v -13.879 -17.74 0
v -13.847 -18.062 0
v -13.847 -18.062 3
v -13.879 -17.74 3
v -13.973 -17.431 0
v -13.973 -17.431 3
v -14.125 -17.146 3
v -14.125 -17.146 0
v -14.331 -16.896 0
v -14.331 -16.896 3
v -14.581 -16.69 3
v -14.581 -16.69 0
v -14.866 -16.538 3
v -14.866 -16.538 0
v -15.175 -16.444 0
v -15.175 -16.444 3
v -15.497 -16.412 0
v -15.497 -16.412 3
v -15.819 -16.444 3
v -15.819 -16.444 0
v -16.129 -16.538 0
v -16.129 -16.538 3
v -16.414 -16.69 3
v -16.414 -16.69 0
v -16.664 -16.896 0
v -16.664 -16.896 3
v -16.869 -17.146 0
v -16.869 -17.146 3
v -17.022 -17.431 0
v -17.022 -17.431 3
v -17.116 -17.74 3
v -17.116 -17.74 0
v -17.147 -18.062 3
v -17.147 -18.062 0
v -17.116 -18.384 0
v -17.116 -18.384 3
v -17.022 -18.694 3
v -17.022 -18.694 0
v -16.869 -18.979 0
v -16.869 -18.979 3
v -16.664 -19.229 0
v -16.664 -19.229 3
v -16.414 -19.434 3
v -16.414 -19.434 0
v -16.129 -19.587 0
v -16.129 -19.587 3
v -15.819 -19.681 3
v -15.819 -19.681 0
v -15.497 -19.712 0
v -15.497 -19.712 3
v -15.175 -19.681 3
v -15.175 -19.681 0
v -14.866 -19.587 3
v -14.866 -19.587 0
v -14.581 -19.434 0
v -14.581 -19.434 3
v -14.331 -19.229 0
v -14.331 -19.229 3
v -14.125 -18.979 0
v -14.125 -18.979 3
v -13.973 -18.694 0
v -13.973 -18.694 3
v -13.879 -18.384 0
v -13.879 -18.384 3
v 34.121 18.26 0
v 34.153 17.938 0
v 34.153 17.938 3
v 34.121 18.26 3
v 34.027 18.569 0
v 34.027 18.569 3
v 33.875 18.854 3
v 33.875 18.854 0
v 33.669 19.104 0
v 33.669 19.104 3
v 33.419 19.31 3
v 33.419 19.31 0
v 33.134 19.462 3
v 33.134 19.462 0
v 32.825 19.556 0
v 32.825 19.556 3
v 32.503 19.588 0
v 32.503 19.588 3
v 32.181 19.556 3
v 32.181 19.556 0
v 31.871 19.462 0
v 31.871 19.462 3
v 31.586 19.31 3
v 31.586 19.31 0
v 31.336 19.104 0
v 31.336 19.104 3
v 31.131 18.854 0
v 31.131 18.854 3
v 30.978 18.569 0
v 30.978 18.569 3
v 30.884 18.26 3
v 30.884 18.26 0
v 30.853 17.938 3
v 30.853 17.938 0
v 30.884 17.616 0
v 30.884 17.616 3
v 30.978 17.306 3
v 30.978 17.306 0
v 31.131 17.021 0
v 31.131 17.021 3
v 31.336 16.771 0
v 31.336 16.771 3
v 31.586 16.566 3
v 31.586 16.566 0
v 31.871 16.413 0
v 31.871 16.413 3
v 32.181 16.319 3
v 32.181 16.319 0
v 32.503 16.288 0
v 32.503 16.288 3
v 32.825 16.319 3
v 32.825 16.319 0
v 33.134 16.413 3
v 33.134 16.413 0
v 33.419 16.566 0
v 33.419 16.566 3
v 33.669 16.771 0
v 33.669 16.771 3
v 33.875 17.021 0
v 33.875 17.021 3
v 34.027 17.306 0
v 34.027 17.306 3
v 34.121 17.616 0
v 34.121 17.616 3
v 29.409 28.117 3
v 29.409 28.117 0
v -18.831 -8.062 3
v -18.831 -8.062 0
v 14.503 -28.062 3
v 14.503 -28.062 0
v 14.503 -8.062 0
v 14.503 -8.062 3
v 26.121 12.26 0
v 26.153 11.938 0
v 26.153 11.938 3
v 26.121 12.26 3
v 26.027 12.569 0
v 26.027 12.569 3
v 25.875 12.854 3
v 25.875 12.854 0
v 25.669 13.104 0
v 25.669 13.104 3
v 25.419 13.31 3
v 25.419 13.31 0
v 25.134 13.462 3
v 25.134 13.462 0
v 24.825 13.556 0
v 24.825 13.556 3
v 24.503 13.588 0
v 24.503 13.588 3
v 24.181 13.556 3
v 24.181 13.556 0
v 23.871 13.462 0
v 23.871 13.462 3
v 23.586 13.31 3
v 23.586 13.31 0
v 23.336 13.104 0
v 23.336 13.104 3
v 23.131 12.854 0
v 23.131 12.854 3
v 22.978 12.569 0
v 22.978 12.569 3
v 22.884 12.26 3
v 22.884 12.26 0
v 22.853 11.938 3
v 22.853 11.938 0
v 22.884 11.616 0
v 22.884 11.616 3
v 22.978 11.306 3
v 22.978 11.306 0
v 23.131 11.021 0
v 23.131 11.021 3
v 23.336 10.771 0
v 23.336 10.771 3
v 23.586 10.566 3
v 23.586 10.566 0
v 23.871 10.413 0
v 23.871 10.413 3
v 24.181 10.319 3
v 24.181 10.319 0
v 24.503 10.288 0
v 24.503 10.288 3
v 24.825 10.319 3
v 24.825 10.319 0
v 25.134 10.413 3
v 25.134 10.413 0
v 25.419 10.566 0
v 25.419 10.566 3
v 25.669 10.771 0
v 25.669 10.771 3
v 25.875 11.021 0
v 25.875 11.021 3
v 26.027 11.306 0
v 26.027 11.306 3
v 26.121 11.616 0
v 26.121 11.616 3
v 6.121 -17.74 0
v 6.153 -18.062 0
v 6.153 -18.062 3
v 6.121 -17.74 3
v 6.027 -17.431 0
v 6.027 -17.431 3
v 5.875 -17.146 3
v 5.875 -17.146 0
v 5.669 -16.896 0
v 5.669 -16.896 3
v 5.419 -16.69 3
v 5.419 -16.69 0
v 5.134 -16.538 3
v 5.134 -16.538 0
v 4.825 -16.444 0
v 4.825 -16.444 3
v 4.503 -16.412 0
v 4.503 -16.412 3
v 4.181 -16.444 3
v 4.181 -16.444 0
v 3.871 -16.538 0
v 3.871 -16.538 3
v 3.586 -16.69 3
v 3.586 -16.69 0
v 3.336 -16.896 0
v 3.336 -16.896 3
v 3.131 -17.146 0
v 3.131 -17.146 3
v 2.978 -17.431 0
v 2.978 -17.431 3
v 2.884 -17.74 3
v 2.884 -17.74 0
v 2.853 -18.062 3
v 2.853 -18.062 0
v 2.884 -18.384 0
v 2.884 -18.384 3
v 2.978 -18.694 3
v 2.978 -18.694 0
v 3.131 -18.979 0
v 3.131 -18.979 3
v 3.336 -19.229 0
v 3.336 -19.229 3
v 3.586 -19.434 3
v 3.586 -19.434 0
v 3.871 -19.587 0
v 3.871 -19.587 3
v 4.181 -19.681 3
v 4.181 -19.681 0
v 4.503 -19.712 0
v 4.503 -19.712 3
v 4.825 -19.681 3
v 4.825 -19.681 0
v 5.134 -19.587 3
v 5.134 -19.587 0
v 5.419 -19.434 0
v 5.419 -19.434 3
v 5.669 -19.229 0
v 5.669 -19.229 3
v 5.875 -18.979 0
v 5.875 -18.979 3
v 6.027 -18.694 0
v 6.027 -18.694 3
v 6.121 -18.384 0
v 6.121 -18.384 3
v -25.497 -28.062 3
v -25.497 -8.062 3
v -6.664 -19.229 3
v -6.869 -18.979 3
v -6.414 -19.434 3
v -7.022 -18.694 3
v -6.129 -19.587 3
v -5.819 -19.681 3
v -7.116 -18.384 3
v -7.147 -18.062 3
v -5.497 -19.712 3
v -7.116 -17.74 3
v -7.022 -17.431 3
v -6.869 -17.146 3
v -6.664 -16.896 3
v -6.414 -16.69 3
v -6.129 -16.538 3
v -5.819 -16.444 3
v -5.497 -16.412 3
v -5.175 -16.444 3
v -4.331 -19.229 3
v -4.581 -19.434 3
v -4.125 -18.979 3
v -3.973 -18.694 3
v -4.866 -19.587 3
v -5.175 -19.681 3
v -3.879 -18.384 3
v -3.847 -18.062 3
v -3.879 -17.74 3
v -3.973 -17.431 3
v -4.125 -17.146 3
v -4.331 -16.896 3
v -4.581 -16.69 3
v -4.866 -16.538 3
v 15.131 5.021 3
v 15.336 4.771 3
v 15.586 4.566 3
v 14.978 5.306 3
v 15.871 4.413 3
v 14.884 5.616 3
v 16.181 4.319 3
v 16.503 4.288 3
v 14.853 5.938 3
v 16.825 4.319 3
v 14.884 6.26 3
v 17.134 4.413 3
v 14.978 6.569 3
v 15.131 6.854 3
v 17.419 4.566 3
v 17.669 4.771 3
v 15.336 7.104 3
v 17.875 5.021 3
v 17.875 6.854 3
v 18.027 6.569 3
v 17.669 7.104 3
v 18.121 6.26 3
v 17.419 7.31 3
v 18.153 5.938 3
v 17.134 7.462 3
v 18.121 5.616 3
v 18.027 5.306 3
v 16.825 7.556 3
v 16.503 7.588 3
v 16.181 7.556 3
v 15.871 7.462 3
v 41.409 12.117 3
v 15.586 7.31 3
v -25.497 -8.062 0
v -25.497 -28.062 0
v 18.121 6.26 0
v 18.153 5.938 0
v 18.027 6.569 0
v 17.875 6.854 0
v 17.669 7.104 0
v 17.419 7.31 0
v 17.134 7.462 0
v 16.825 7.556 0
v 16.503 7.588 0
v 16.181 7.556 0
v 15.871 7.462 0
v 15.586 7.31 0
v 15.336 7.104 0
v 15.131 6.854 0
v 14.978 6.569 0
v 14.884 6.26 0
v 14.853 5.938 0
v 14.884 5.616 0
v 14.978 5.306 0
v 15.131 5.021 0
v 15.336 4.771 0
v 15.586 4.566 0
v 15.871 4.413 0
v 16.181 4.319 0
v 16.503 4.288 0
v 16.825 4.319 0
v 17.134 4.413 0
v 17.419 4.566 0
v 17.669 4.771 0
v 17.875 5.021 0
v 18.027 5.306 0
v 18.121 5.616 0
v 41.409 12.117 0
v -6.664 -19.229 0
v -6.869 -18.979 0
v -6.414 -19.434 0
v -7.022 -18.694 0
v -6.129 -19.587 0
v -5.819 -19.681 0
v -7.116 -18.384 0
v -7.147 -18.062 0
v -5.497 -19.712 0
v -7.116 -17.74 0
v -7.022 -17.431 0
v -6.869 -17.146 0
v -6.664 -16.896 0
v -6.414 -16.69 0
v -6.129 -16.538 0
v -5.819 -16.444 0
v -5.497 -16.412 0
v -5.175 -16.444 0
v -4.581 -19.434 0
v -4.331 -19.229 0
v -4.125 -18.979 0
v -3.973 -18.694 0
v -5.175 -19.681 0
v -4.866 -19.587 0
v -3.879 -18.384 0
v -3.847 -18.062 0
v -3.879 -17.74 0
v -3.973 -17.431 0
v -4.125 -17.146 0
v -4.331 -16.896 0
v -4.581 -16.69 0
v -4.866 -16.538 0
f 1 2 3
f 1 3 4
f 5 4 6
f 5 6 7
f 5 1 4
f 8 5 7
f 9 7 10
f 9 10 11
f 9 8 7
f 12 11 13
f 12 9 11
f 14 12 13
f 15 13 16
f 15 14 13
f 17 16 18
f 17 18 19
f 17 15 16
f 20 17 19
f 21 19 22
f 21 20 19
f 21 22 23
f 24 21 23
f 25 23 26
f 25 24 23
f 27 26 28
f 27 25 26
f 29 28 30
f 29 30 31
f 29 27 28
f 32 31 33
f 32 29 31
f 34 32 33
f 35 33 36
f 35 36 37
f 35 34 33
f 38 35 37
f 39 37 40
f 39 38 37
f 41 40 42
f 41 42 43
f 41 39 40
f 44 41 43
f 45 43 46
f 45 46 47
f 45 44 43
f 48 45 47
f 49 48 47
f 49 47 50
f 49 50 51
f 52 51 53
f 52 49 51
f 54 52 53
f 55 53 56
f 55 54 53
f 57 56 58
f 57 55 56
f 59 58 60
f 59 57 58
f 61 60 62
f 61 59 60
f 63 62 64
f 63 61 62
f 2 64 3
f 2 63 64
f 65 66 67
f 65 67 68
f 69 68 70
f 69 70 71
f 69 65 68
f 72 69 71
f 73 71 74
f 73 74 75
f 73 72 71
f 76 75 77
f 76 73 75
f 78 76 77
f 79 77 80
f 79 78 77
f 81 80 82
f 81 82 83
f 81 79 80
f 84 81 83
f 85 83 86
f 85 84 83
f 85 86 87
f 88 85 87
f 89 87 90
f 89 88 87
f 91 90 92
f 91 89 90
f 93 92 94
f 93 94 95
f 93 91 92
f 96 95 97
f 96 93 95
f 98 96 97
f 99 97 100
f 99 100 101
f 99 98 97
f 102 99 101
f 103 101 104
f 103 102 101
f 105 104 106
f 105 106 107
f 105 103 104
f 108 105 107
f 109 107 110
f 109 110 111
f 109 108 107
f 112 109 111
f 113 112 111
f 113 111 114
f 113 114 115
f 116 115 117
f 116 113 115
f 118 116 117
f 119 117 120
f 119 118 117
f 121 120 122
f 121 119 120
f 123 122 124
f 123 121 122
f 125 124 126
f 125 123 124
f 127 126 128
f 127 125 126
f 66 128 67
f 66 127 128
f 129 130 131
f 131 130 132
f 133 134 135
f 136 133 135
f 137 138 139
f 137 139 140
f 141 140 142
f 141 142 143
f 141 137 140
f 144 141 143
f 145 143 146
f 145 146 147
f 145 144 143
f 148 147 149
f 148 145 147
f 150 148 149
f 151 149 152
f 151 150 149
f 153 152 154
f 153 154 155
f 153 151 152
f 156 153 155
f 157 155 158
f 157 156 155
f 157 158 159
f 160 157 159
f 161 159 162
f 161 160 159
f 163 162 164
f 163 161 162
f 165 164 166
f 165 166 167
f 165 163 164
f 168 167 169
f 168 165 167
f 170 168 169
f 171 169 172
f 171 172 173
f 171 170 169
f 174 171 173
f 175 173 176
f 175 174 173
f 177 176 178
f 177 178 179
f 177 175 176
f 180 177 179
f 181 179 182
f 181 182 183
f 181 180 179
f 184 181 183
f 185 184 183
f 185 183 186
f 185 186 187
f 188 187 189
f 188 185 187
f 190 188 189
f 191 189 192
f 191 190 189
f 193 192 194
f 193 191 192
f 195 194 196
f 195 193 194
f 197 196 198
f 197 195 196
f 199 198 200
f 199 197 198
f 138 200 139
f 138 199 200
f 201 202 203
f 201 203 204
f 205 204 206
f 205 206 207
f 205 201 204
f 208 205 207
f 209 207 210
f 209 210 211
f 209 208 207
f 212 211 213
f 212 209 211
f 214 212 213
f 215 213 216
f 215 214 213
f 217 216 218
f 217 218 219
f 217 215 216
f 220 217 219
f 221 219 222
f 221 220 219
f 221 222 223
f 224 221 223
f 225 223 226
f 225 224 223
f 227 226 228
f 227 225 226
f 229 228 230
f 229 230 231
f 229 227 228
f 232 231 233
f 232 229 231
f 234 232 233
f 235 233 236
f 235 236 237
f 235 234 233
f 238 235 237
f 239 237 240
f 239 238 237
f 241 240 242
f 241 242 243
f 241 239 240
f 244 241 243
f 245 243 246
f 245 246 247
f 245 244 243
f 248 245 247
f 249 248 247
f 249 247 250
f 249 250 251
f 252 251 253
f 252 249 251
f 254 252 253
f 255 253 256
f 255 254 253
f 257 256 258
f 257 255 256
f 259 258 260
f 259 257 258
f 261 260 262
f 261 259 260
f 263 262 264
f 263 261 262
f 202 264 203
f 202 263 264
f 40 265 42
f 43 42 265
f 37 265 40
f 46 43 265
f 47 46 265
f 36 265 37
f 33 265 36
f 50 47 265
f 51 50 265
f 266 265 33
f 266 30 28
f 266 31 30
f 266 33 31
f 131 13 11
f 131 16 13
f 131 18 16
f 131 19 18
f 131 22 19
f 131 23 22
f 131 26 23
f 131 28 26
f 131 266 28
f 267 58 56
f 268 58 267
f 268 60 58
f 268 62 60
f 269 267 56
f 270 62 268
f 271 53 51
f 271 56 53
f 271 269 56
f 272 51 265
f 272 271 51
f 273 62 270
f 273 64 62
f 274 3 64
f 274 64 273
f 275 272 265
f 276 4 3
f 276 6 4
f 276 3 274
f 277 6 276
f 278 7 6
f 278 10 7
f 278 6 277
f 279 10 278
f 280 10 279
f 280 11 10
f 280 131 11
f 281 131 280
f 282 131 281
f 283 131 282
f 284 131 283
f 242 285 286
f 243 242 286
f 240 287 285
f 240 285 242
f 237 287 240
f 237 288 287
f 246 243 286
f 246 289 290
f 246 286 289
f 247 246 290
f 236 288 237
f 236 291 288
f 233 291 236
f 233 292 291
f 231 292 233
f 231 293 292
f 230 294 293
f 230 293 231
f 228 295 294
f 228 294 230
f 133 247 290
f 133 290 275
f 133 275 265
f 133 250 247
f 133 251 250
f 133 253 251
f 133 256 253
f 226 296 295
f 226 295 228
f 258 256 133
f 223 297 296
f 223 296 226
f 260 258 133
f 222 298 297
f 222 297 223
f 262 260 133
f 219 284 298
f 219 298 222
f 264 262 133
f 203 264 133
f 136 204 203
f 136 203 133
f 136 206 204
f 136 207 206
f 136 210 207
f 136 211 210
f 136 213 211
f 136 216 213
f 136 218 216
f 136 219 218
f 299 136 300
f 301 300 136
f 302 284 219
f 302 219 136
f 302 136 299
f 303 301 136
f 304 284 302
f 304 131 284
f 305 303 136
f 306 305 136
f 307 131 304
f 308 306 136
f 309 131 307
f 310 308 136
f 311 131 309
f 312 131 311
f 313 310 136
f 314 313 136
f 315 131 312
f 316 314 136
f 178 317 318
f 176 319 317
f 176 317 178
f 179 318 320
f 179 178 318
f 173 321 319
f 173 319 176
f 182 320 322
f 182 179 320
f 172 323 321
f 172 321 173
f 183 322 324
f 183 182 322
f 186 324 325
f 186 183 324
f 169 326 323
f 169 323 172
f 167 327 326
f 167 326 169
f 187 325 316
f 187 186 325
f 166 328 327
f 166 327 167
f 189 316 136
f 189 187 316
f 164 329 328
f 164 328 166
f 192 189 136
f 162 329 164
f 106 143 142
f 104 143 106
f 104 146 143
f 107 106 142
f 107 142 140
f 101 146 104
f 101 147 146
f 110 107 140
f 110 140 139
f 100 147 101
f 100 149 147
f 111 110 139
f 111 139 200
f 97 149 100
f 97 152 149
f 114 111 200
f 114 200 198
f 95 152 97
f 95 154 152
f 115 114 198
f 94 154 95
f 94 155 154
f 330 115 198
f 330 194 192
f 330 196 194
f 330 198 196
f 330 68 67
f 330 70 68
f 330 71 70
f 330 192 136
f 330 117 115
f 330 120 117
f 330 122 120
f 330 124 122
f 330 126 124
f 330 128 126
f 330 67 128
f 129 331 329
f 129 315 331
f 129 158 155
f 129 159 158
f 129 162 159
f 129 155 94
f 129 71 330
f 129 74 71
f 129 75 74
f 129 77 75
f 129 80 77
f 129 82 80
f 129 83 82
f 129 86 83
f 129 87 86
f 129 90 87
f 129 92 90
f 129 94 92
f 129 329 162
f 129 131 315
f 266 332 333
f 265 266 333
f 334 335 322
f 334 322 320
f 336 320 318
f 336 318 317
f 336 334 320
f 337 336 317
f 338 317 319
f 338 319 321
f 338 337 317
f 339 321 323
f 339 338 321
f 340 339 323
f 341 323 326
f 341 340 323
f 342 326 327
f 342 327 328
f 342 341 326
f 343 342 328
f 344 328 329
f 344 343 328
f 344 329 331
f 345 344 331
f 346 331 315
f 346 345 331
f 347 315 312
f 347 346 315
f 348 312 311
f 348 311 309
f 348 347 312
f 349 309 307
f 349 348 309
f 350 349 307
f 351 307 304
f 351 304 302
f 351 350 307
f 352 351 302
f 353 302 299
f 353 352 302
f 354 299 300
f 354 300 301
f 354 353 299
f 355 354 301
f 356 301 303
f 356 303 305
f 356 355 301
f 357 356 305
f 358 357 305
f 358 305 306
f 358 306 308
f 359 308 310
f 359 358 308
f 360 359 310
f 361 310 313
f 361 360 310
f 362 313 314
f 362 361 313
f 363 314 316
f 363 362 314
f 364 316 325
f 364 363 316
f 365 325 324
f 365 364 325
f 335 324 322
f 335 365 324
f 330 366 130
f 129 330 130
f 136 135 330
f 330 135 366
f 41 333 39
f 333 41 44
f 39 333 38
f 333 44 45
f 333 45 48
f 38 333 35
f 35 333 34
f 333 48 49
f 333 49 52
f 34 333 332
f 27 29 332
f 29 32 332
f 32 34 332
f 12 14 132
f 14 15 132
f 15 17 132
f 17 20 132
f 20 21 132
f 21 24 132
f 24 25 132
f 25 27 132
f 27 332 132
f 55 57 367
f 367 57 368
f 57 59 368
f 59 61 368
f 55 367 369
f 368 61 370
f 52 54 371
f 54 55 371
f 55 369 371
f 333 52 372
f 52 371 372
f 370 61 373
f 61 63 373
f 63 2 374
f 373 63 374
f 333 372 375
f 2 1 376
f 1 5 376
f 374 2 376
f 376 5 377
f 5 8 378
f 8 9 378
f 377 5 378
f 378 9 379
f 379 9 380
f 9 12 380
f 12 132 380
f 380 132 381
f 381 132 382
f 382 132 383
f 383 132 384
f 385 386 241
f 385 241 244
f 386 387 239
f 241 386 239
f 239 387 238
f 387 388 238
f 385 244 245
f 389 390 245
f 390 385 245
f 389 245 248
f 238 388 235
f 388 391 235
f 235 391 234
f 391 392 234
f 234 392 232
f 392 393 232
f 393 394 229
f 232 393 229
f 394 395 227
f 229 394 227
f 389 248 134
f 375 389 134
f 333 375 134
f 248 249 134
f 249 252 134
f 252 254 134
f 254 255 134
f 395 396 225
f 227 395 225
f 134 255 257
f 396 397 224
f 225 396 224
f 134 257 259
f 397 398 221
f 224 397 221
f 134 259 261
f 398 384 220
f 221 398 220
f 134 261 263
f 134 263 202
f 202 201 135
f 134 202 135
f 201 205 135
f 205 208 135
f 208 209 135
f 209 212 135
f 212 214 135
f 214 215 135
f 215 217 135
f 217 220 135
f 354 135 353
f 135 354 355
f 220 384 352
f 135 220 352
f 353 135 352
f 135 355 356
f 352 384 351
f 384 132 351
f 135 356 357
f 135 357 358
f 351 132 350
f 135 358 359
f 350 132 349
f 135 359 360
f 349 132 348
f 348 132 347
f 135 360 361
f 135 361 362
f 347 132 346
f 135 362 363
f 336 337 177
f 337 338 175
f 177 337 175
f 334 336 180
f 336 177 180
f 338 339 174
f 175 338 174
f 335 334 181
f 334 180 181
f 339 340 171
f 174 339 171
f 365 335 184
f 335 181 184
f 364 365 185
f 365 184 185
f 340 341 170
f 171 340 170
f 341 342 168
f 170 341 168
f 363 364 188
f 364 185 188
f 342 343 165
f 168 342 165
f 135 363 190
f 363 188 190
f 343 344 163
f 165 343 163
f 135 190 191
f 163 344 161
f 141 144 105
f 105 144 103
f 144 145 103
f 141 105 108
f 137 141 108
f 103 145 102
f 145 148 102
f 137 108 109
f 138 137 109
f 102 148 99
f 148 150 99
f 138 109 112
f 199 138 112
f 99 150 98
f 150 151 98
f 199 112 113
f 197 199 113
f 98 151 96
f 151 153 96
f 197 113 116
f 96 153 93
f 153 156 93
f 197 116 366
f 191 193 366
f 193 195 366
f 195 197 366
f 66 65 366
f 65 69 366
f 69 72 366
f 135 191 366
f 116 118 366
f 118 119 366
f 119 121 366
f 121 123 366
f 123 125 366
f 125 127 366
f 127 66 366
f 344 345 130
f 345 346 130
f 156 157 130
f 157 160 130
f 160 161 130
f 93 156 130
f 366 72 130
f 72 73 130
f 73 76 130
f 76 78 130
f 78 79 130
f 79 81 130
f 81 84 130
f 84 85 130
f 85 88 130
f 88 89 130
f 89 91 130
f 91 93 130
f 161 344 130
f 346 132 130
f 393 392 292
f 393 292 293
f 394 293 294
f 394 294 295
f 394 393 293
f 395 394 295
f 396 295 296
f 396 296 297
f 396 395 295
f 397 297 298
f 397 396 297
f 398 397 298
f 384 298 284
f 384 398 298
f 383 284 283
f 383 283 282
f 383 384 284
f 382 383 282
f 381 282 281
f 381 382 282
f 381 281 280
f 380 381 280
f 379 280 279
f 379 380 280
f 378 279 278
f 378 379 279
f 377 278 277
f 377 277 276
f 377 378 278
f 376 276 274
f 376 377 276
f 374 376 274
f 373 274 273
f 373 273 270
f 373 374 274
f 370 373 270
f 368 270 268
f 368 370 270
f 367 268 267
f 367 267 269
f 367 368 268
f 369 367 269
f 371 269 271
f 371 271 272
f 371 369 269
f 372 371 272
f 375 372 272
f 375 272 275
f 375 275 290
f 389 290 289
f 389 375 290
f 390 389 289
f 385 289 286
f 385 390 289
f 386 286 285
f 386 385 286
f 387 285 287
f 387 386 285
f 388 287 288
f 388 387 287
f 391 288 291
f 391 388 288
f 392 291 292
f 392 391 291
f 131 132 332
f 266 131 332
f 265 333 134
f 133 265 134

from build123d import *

# Parameters (mm, degrees)
SKETCH_1_R      = 1.65
EXTRUDE_1_DEPTH = 3


with BuildPart() as part:
    # 草图1 → 凸台-拉伸1 (new body)
    with BuildSketch(Plane.XY):
        Polygon((-18.830697363, -8.06225338), (-25.497363461, -8.06225338), (-25.497363461, -28.06225338), (14.502631424, -28.06225338), (14.502631424, -8.06225338), (41.408851068, 12.117415653), (29.408849432, 28.117414426), align=None)
        with Locations((-5.497363461, -18.06225338)):
            Circle(SKETCH_1_R, mode=Mode.SUBTRACT)
        with Locations((4.502636539, -18.06225338)):
            Circle(SKETCH_1_R, mode=Mode.SUBTRACT)
        with Locations((-15.497363461, -18.06225338)):
            Circle(SKETCH_1_R, mode=Mode.SUBTRACT)
        with Locations((16.502629992, 5.937746824)):
            Circle(SKETCH_1_R, mode=Mode.SUBTRACT)
        with Locations((24.502629378, 11.937747642)):
            Circle(SKETCH_1_R, mode=Mode.SUBTRACT)
        with Locations((32.502628764, 17.937748461)):
            Circle(SKETCH_1_R, mode=Mode.SUBTRACT)
    extrude(amount=EXTRUDE_1_DEPTH)


solid = part.part
